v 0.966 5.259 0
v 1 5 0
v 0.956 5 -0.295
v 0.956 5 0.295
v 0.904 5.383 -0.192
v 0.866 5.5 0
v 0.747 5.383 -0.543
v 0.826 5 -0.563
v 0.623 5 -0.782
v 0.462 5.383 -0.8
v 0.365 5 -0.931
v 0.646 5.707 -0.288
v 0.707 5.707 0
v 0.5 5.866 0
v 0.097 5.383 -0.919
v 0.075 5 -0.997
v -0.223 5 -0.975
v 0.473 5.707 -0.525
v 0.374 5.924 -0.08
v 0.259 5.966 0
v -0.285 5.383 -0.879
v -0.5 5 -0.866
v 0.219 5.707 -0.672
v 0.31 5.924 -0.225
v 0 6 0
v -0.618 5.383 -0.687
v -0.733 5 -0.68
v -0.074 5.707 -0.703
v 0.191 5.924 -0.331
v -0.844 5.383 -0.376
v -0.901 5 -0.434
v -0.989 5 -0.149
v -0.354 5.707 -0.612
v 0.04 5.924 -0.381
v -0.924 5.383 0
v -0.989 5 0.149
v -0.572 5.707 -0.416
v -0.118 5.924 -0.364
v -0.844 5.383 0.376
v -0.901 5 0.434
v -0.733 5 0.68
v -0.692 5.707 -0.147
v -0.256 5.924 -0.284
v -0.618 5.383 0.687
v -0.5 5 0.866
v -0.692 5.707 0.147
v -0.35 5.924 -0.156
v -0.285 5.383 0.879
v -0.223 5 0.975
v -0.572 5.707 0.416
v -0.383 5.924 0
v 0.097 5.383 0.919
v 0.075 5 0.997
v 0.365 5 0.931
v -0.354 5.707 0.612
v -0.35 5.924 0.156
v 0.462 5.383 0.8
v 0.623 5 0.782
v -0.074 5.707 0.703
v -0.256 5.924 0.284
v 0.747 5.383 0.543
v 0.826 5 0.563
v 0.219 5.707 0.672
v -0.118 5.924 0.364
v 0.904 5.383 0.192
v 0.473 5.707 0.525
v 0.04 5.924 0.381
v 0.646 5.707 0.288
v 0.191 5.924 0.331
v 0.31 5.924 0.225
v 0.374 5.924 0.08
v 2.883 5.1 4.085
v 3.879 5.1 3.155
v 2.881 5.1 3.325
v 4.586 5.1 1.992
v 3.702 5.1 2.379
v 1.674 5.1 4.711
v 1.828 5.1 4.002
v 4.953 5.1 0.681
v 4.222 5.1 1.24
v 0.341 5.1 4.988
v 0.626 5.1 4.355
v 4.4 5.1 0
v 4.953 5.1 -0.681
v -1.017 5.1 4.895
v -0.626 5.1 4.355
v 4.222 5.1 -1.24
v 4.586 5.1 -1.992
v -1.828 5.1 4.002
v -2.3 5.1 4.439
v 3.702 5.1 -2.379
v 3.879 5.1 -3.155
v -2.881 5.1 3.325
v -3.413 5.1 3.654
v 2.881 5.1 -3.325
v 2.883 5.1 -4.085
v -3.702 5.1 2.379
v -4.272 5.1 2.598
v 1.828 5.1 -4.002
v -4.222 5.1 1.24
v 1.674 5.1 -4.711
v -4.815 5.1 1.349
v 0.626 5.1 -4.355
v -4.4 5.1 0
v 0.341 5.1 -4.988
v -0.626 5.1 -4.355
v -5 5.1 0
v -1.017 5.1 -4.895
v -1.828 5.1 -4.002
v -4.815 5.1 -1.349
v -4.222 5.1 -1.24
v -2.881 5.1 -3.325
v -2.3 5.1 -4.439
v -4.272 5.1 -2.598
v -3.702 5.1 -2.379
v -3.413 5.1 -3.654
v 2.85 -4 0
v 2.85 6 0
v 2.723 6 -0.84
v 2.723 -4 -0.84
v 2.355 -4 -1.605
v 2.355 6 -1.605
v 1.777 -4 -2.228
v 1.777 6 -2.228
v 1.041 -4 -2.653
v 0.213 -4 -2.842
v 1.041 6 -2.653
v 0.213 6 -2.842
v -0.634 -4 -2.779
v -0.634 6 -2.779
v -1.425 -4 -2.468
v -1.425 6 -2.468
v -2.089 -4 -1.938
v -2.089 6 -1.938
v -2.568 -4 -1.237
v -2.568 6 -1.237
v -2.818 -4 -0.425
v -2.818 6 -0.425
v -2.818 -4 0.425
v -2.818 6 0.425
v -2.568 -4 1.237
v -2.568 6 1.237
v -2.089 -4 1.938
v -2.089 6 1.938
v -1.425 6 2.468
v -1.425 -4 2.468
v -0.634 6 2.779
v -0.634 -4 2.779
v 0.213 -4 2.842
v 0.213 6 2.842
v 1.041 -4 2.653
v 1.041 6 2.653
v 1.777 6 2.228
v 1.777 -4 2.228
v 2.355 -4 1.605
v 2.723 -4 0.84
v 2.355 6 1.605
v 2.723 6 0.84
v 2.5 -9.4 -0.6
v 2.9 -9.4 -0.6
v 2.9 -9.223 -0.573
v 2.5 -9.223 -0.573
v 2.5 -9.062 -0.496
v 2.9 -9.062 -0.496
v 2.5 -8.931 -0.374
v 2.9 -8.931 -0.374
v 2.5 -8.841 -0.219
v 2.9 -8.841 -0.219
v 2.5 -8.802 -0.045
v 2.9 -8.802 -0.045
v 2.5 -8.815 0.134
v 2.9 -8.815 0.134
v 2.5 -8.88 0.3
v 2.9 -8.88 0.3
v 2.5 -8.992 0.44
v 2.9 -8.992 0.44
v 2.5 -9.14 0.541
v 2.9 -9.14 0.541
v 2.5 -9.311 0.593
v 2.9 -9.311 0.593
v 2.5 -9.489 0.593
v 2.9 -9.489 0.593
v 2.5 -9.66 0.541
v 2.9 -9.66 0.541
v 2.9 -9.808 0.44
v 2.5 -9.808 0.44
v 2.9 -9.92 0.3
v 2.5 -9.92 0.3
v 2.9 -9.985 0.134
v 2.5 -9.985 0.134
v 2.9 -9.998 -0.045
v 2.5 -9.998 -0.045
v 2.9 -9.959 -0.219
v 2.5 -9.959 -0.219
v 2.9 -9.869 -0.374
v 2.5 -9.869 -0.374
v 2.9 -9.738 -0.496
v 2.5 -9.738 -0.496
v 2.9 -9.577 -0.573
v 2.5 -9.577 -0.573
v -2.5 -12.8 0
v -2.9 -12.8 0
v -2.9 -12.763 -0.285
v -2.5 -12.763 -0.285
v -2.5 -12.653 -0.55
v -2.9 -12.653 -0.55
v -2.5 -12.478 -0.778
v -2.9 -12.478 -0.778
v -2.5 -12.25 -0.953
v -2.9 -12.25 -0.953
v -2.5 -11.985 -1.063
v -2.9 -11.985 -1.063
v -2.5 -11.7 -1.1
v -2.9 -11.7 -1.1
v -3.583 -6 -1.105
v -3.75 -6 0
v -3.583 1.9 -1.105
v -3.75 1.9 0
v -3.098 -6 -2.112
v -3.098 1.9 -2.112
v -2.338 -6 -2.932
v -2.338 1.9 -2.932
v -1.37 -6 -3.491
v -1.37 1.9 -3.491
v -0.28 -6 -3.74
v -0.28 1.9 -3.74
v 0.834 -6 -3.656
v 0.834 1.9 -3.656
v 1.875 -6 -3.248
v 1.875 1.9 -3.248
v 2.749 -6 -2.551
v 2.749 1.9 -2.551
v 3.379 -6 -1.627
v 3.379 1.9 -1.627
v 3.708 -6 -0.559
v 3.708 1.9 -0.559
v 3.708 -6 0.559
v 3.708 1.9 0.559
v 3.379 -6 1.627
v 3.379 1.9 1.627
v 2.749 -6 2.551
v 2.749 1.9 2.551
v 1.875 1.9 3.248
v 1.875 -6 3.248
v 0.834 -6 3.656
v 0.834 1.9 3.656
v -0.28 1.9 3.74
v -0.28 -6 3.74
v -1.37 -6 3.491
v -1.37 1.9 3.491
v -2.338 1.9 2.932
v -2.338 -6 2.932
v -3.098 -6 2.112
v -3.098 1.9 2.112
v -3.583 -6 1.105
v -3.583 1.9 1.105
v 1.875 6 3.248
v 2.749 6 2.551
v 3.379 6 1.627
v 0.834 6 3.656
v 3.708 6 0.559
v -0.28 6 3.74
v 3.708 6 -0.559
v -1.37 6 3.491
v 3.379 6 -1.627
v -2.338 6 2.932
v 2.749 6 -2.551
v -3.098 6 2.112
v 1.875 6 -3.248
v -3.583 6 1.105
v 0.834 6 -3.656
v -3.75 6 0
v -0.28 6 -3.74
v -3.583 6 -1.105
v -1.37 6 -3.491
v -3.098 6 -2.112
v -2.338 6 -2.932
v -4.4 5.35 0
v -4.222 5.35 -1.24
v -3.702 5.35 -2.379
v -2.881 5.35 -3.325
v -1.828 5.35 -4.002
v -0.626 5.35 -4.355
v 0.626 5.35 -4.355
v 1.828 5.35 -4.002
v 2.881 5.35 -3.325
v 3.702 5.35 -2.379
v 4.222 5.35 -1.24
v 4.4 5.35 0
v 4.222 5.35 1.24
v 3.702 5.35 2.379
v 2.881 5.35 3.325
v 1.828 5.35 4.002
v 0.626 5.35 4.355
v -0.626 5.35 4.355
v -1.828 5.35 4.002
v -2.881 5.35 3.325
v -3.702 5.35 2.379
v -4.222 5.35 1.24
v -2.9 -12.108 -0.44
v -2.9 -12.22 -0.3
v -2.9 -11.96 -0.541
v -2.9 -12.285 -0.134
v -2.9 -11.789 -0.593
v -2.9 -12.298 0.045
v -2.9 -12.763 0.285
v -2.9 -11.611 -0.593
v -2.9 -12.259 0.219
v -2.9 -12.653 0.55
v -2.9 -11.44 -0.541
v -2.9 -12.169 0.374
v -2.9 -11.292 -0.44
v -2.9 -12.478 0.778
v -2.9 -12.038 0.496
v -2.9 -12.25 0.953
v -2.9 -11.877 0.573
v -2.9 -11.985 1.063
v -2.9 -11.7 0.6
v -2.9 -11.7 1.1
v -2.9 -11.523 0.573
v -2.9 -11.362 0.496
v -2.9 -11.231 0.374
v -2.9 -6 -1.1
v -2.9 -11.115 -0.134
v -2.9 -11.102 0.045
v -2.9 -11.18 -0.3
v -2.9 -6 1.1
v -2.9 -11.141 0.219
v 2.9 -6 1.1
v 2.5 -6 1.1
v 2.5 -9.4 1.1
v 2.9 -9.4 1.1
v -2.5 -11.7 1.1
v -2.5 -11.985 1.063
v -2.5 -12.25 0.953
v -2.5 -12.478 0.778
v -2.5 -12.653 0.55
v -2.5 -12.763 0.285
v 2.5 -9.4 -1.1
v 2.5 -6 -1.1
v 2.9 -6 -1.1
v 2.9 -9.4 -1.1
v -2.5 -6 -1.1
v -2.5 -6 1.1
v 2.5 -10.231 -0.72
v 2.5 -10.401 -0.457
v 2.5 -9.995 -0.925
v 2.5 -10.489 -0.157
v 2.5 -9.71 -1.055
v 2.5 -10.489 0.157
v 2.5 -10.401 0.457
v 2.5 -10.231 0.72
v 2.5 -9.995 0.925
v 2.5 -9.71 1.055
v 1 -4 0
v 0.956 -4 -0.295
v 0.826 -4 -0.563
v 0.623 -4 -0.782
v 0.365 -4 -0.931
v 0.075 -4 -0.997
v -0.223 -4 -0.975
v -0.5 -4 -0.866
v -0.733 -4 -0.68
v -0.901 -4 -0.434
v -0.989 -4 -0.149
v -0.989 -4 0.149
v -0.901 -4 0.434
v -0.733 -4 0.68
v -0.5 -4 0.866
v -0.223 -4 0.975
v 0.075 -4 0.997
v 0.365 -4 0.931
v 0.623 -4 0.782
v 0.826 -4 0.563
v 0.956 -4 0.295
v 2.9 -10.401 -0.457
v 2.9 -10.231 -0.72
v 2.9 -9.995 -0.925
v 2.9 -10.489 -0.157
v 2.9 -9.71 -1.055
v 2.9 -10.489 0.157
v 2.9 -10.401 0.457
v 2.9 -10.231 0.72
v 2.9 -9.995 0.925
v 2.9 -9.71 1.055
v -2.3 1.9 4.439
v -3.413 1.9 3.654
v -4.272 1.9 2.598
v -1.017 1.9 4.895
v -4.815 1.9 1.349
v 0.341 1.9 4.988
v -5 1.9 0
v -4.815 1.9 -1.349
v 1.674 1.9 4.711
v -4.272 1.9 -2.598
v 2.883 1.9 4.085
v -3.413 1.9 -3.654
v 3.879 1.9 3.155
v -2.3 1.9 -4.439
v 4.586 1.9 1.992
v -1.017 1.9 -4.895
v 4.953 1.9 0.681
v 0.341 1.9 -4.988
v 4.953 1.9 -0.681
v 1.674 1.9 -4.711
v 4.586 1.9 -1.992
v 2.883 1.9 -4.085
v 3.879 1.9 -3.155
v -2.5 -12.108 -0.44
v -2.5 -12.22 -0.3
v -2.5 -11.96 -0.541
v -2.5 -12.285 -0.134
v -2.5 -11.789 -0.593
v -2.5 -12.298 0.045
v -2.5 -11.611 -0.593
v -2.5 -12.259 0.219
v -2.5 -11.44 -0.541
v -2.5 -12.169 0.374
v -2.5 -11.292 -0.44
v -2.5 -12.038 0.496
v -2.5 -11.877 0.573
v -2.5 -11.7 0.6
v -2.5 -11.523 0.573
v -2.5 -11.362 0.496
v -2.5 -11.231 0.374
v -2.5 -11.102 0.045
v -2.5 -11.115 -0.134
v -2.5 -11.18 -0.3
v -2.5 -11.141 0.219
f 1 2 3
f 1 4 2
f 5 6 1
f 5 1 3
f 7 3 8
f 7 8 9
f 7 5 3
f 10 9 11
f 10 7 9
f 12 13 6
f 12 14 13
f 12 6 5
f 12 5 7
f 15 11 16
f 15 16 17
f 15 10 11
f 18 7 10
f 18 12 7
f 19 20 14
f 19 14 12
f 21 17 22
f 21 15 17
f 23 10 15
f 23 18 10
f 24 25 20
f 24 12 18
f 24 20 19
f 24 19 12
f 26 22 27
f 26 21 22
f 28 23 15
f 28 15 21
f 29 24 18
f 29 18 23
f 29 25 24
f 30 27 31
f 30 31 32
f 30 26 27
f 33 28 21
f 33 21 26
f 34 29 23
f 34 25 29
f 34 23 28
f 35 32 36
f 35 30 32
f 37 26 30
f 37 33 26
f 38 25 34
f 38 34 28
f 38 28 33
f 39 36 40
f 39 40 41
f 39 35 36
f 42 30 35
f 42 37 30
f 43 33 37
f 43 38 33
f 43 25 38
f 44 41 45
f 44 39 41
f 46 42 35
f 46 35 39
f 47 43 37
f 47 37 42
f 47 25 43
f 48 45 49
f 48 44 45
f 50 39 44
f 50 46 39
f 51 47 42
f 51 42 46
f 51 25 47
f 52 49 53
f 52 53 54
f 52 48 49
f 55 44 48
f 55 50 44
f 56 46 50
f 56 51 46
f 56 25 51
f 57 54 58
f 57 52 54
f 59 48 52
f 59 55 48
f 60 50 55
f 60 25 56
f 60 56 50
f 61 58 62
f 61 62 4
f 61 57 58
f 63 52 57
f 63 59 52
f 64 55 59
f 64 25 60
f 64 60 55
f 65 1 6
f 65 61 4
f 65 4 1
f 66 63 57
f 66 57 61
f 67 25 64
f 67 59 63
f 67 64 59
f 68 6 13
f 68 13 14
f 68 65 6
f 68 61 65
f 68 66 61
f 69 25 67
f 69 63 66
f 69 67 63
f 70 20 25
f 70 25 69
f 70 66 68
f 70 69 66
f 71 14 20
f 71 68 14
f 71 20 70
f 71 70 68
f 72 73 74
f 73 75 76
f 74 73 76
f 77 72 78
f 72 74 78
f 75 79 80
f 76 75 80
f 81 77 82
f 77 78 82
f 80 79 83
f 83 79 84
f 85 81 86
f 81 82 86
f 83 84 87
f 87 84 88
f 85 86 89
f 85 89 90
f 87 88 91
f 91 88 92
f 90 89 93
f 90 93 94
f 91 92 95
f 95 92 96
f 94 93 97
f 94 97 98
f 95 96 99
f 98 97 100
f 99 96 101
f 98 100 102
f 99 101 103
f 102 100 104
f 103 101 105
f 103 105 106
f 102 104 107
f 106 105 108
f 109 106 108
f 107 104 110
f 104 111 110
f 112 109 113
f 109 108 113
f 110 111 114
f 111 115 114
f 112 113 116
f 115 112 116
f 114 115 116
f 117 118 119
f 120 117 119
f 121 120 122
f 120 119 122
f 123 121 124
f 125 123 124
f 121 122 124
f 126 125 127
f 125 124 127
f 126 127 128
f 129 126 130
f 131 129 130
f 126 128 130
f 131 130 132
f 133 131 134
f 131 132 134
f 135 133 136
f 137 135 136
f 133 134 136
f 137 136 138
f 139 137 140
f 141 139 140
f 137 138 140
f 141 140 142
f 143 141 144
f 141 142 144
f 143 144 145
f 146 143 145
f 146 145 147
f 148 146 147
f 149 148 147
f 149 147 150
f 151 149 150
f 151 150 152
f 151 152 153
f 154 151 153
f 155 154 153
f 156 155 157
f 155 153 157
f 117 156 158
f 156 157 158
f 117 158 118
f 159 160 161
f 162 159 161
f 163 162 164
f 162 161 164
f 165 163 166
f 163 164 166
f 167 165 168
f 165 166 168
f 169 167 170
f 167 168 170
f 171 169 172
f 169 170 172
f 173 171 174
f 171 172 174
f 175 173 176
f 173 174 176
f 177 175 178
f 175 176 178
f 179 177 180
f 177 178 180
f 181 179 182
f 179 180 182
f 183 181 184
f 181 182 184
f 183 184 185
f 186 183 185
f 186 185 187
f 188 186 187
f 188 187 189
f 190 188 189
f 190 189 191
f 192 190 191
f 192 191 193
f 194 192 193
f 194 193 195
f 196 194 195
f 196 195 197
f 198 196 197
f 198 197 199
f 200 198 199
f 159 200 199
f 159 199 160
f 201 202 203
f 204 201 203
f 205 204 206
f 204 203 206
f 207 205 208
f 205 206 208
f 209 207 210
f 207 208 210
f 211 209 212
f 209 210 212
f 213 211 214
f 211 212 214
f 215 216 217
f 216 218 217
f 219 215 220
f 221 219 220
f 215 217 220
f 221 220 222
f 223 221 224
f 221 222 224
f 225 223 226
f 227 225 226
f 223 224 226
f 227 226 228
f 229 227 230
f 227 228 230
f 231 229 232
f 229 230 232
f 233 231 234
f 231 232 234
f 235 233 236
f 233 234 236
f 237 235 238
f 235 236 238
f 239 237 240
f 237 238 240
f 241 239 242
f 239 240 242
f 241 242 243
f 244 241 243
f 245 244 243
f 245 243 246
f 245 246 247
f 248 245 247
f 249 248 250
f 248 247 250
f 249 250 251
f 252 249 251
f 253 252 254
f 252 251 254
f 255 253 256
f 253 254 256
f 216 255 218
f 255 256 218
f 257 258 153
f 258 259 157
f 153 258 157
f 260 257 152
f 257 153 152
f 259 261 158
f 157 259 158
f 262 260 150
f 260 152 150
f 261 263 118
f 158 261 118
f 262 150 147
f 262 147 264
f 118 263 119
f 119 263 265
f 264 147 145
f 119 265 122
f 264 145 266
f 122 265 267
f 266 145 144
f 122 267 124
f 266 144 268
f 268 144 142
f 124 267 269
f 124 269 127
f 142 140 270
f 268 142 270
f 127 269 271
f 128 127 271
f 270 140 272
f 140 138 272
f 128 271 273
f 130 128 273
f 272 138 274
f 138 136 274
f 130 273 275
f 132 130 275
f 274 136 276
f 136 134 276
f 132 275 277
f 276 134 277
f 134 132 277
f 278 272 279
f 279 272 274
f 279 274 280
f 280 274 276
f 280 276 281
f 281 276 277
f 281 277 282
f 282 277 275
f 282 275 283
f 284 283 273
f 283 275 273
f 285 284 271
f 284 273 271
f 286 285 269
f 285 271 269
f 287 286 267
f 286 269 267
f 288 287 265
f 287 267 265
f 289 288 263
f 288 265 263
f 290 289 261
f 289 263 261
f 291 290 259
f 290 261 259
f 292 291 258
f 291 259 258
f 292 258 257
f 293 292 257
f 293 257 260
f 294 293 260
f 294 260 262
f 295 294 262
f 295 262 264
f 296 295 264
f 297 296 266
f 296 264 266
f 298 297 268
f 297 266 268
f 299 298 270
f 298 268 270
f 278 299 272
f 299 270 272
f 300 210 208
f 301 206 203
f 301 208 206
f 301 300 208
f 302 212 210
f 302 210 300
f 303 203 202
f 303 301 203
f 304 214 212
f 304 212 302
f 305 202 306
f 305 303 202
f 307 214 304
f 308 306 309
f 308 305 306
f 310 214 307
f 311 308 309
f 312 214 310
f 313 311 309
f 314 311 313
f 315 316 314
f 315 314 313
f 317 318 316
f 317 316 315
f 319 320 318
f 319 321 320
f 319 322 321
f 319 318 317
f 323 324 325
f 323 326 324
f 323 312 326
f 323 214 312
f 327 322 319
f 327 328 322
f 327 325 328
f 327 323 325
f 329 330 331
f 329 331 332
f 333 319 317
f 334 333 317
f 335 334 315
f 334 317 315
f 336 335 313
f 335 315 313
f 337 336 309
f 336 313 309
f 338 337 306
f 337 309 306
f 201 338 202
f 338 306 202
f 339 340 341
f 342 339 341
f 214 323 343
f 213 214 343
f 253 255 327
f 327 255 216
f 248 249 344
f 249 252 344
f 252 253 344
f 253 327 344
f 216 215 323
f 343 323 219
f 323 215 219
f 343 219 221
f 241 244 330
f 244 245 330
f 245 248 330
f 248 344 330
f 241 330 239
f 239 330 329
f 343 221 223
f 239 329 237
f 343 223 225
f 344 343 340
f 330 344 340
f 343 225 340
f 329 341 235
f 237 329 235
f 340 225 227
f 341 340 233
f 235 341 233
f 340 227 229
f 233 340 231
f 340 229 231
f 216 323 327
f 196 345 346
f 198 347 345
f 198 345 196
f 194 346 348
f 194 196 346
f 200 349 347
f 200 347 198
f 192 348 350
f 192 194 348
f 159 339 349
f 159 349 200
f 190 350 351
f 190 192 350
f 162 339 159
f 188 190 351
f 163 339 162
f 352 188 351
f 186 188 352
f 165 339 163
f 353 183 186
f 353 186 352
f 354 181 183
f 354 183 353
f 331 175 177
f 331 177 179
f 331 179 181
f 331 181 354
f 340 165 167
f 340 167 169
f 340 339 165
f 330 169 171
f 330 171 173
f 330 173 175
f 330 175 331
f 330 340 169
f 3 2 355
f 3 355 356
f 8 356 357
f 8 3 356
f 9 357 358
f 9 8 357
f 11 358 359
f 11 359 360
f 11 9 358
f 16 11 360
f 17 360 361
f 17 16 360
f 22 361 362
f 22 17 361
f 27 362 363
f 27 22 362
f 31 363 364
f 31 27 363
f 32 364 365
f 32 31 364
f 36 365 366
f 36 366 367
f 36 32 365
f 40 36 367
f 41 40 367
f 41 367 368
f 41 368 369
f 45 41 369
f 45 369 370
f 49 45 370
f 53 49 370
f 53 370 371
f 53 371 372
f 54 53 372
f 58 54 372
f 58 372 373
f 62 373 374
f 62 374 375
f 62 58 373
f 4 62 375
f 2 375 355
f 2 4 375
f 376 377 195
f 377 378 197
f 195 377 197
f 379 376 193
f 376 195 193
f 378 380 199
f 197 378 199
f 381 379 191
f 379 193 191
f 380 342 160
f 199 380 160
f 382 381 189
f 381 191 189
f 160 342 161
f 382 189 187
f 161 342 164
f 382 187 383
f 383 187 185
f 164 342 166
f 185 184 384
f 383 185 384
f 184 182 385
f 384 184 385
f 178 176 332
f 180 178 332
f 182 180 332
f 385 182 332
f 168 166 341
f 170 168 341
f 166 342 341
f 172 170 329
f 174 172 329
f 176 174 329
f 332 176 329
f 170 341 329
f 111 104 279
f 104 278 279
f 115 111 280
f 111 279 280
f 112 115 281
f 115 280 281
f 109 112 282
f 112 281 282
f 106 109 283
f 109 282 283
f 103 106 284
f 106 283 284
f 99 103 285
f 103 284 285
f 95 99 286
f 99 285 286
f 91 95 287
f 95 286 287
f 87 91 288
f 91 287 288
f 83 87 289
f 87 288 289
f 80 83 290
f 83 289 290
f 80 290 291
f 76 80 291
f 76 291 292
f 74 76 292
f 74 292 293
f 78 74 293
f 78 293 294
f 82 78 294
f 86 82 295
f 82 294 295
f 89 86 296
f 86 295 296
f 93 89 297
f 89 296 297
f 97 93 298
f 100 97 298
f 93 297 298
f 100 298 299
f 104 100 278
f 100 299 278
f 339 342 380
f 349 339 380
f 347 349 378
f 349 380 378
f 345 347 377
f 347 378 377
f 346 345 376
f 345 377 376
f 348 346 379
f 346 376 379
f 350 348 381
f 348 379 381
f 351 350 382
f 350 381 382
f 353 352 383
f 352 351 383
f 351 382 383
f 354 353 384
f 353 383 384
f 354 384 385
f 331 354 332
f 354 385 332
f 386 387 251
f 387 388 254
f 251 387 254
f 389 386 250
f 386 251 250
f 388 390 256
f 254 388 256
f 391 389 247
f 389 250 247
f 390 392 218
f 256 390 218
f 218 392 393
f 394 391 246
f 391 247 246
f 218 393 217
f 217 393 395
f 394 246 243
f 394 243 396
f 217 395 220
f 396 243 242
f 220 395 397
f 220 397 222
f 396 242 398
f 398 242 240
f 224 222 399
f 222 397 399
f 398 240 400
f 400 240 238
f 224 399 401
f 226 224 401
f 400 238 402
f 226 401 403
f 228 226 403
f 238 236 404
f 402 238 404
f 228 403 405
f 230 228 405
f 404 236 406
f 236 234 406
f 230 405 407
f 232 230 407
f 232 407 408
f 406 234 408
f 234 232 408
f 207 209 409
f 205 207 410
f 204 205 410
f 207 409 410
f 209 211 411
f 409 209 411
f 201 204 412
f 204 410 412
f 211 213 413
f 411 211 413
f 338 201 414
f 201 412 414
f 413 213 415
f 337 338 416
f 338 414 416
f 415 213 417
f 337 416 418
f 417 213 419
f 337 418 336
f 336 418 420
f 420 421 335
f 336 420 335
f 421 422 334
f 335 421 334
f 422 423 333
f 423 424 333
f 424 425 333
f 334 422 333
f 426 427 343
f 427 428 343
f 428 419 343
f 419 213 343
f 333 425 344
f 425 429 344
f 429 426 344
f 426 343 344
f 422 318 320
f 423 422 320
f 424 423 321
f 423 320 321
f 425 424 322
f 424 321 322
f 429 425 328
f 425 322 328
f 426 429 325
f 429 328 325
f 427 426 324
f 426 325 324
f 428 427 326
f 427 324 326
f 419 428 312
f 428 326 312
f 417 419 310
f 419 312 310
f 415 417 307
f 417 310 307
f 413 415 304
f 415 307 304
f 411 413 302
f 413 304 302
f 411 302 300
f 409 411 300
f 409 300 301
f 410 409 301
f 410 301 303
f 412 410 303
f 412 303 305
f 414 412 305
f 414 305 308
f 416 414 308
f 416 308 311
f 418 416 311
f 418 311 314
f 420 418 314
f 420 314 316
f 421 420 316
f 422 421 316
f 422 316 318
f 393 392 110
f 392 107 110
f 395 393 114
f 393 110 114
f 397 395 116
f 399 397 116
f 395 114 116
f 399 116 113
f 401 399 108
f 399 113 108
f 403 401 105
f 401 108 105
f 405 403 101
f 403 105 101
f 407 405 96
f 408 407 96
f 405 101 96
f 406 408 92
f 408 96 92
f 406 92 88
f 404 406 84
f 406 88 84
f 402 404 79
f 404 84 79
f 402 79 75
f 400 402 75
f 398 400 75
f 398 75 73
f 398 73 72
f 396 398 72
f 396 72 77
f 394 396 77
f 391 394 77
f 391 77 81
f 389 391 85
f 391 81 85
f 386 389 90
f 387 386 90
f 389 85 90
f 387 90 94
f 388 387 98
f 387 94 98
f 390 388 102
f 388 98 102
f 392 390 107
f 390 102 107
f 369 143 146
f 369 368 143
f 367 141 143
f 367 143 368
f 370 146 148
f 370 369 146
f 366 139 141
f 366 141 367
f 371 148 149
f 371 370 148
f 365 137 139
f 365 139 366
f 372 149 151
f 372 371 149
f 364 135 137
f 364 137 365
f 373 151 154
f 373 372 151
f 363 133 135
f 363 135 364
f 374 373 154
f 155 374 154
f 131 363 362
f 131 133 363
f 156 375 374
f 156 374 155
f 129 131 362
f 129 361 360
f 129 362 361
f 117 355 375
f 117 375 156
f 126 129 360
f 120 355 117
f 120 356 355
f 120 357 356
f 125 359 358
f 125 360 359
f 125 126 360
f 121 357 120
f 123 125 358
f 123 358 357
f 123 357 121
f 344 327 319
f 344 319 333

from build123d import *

# Parameters (mm, degrees)
ESQUISSE2_R             = 2.85
ESQUISSE2_R_2           = 1
ENL_V_MAT_EXTRU_1_DEPTH = 10
CONG_1_R                = 1
ESQUISSE3_W             = 0.4
ESQUISSE3_H             = 2.2
BOSS_EXTRU_1_DEPTH      = 6.8
ENL_V_MAT_EXTRU_2_REACH = 9.9
ESQUISSE4_R             = 0.6
ENL_V_MAT_EXTRU_3_REACH = 9.9
ESQUISSE6_R             = 0.6


with BuildPart() as part:
    # Esquisse1 → Révolution1 (revolve)
    with BuildSketch(Plane.XY):
        Polygon((0, -6), (-3.75, -6), (-3.75, 1.9), (-5, 1.9), (-5, 5.1), (-4.4, 5.1), (-4.4, 5.35), (-3.75, 6), (0, 6), align=None)
    revolve(axis=Axis((0, 6, 0), (0, -1, 0)))

    # Esquisse2 → Enlèv. mat.-Extru.1 (cut)
    with BuildSketch(Plane(origin=(0, 6, 0), x_dir=(1, 0, 0), z_dir=(0, 1, 0))):
        Circle(ESQUISSE2_R)
        Circle(ESQUISSE2_R_2, mode=Mode.SUBTRACT)
    extrude(amount=-ENL_V_MAT_EXTRU_1_DEPTH, mode=Mode.SUBTRACT)

    # Congé1
    cong_1_edges = [part.edges().sort_by_distance(p)[0] for p in [
        (-1, 6, 0),
    ]]
    fillet(cong_1_edges, radius=CONG_1_R)

    # Esquisse3 → Boss.-Extru.1 (add)
    with BuildSketch(Plane.XZ.offset(6)):
        with Locations((-2.7, 0)):
            Rectangle(ESQUISSE3_W, ESQUISSE3_H)
        with Locations((2.7, 0)):
            Rectangle(ESQUISSE3_W, ESQUISSE3_H)
    extrude(amount=BOSS_EXTRU_1_DEPTH)

    # Esquisse4 → Enlèv. mat.-Extru.2 (cut, up to next)
    with BuildSketch(Plane(origin=(2.9, 0, 0), x_dir=(0, 0, -1), z_dir=(1, 0, 0)), mode=Mode.PRIVATE) as enl_v_mat_extru_2_sk1:
        with BuildLine():
            ThreePointArc((1.1, -9.4), (0, -10.5), (-1.1, -9.4))
            Line((-1.1, -9.4), (-1.1, -12.8))
            Line((-1.1, -12.8), (1.1, -12.8))
            Line((1.1, -12.8), (1.1, -9.4))
        make_face()
    enl_v_mat_extru_2_tool1 = extrude(enl_v_mat_extru_2_sk1.sketch, amount=-ENL_V_MAT_EXTRU_2_REACH, mode=Mode.PRIVATE) & part.part
    add(enl_v_mat_extru_2_tool1.solids().sort_by_distance((2.9, -11.520085, 0))[0], mode=Mode.SUBTRACT)
    # Esquisse4 → Enlèv. mat.-Extru.2 (cut, up to next)
    with BuildSketch(Plane(origin=(2.9, 0, 0), x_dir=(0, 0, -1), z_dir=(1, 0, 0)), mode=Mode.PRIVATE) as enl_v_mat_extru_2_sk2:
        with Locations((0, -9.4)):
            Circle(ESQUISSE4_R)
    enl_v_mat_extru_2_tool2 = extrude(enl_v_mat_extru_2_sk2.sketch, amount=-ENL_V_MAT_EXTRU_2_REACH, mode=Mode.PRIVATE) & part.part
    add(enl_v_mat_extru_2_tool2.solids().sort_by_distance((2.9, -9.4, 0))[0], mode=Mode.SUBTRACT)

    # Esquisse6 → Enlèv. mat.-Extru.3 (cut, up to next)
    with BuildSketch(Plane.ZY.offset(2.9), mode=Mode.PRIVATE) as enl_v_mat_extru_3_sk1:
        with BuildLine():
            ThreePointArc((0, -12.8), (-0.777817459, -12.477817459), (-1.1, -11.7))
            Line((-1.1, -11.7), (-1.1, -12.8))
            Line((-1.1, -12.8), (0, -12.8))
        make_face()
    enl_v_mat_extru_3_tool1 = extrude(enl_v_mat_extru_3_sk1.sketch, amount=-ENL_V_MAT_EXTRU_3_REACH, mode=Mode.PRIVATE) & part.part
    add(enl_v_mat_extru_3_tool1.solids().sort_by_distance((-2.9, -12.554295, -0.854295))[0], mode=Mode.SUBTRACT)
    # Esquisse6 → Enlèv. mat.-Extru.3 (cut, up to next)
    with BuildSketch(Plane.ZY.offset(2.9), mode=Mode.PRIVATE) as enl_v_mat_extru_3_sk2:
        with BuildLine():
            ThreePointArc((1.1, -11.7), (0.777817459, -12.477817459), (0, -12.8))
            Line((0, -12.8), (1.1, -12.8))
            Line((1.1, -12.8), (1.1, -11.7))
        make_face()
    enl_v_mat_extru_3_tool2 = extrude(enl_v_mat_extru_3_sk2.sketch, amount=-ENL_V_MAT_EXTRU_3_REACH, mode=Mode.PRIVATE) & part.part
    add(enl_v_mat_extru_3_tool2.solids().sort_by_distance((-2.9, -12.554295, 0.854295))[0], mode=Mode.SUBTRACT)
    # Esquisse6 → Enlèv. mat.-Extru.3 (cut, up to next)
    with BuildSketch(Plane.ZY.offset(2.9), mode=Mode.PRIVATE) as enl_v_mat_extru_3_sk3:
        with Locations((0, -11.7)):
            Circle(ESQUISSE6_R)
    enl_v_mat_extru_3_tool3 = extrude(enl_v_mat_extru_3_sk3.sketch, amount=-ENL_V_MAT_EXTRU_3_REACH, mode=Mode.PRIVATE) & part.part
    add(enl_v_mat_extru_3_tool3.solids().sort_by_distance((-2.9, -11.7, 0))[0], mode=Mode.SUBTRACT)


solid = part.part
